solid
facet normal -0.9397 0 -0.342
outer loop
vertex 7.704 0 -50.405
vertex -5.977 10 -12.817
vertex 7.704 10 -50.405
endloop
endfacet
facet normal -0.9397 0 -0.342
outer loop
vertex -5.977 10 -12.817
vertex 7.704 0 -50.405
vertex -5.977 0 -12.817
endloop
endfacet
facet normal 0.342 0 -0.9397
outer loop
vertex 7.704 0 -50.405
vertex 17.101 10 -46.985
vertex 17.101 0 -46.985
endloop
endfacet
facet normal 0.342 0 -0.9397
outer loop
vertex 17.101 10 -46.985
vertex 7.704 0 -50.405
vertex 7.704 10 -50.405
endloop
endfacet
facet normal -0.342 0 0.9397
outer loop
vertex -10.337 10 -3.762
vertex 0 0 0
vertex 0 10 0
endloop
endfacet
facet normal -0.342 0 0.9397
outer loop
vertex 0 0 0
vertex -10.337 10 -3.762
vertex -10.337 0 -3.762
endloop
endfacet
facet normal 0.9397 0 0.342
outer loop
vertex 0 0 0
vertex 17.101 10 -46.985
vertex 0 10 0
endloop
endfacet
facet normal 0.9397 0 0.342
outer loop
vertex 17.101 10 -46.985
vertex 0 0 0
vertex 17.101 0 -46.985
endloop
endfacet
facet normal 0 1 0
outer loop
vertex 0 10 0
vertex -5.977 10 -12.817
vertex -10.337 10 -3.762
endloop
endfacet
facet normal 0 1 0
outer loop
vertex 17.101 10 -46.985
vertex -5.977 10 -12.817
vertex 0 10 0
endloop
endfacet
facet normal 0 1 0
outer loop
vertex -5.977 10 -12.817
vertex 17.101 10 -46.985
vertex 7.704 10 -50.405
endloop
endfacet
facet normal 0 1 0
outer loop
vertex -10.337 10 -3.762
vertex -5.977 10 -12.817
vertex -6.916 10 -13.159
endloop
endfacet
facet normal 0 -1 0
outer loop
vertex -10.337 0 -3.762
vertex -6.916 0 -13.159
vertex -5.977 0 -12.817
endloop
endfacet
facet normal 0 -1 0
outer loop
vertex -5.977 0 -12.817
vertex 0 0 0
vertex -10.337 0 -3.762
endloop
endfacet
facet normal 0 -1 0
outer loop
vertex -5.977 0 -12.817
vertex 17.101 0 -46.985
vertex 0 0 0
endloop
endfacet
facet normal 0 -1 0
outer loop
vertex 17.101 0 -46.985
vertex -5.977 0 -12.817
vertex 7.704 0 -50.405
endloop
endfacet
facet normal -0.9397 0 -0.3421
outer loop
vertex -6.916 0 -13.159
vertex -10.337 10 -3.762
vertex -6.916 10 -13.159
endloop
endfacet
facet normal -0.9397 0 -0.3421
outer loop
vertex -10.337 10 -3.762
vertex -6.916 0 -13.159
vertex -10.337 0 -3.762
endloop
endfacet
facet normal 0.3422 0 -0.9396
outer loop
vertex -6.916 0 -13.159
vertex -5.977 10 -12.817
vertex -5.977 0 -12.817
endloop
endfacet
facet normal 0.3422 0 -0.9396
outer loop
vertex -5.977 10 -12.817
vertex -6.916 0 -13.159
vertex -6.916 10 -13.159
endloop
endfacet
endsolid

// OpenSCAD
rotate([0, 160, 0]) {
	cube([10, 10, 50]);
	cube([11, 10, 10]);
}
